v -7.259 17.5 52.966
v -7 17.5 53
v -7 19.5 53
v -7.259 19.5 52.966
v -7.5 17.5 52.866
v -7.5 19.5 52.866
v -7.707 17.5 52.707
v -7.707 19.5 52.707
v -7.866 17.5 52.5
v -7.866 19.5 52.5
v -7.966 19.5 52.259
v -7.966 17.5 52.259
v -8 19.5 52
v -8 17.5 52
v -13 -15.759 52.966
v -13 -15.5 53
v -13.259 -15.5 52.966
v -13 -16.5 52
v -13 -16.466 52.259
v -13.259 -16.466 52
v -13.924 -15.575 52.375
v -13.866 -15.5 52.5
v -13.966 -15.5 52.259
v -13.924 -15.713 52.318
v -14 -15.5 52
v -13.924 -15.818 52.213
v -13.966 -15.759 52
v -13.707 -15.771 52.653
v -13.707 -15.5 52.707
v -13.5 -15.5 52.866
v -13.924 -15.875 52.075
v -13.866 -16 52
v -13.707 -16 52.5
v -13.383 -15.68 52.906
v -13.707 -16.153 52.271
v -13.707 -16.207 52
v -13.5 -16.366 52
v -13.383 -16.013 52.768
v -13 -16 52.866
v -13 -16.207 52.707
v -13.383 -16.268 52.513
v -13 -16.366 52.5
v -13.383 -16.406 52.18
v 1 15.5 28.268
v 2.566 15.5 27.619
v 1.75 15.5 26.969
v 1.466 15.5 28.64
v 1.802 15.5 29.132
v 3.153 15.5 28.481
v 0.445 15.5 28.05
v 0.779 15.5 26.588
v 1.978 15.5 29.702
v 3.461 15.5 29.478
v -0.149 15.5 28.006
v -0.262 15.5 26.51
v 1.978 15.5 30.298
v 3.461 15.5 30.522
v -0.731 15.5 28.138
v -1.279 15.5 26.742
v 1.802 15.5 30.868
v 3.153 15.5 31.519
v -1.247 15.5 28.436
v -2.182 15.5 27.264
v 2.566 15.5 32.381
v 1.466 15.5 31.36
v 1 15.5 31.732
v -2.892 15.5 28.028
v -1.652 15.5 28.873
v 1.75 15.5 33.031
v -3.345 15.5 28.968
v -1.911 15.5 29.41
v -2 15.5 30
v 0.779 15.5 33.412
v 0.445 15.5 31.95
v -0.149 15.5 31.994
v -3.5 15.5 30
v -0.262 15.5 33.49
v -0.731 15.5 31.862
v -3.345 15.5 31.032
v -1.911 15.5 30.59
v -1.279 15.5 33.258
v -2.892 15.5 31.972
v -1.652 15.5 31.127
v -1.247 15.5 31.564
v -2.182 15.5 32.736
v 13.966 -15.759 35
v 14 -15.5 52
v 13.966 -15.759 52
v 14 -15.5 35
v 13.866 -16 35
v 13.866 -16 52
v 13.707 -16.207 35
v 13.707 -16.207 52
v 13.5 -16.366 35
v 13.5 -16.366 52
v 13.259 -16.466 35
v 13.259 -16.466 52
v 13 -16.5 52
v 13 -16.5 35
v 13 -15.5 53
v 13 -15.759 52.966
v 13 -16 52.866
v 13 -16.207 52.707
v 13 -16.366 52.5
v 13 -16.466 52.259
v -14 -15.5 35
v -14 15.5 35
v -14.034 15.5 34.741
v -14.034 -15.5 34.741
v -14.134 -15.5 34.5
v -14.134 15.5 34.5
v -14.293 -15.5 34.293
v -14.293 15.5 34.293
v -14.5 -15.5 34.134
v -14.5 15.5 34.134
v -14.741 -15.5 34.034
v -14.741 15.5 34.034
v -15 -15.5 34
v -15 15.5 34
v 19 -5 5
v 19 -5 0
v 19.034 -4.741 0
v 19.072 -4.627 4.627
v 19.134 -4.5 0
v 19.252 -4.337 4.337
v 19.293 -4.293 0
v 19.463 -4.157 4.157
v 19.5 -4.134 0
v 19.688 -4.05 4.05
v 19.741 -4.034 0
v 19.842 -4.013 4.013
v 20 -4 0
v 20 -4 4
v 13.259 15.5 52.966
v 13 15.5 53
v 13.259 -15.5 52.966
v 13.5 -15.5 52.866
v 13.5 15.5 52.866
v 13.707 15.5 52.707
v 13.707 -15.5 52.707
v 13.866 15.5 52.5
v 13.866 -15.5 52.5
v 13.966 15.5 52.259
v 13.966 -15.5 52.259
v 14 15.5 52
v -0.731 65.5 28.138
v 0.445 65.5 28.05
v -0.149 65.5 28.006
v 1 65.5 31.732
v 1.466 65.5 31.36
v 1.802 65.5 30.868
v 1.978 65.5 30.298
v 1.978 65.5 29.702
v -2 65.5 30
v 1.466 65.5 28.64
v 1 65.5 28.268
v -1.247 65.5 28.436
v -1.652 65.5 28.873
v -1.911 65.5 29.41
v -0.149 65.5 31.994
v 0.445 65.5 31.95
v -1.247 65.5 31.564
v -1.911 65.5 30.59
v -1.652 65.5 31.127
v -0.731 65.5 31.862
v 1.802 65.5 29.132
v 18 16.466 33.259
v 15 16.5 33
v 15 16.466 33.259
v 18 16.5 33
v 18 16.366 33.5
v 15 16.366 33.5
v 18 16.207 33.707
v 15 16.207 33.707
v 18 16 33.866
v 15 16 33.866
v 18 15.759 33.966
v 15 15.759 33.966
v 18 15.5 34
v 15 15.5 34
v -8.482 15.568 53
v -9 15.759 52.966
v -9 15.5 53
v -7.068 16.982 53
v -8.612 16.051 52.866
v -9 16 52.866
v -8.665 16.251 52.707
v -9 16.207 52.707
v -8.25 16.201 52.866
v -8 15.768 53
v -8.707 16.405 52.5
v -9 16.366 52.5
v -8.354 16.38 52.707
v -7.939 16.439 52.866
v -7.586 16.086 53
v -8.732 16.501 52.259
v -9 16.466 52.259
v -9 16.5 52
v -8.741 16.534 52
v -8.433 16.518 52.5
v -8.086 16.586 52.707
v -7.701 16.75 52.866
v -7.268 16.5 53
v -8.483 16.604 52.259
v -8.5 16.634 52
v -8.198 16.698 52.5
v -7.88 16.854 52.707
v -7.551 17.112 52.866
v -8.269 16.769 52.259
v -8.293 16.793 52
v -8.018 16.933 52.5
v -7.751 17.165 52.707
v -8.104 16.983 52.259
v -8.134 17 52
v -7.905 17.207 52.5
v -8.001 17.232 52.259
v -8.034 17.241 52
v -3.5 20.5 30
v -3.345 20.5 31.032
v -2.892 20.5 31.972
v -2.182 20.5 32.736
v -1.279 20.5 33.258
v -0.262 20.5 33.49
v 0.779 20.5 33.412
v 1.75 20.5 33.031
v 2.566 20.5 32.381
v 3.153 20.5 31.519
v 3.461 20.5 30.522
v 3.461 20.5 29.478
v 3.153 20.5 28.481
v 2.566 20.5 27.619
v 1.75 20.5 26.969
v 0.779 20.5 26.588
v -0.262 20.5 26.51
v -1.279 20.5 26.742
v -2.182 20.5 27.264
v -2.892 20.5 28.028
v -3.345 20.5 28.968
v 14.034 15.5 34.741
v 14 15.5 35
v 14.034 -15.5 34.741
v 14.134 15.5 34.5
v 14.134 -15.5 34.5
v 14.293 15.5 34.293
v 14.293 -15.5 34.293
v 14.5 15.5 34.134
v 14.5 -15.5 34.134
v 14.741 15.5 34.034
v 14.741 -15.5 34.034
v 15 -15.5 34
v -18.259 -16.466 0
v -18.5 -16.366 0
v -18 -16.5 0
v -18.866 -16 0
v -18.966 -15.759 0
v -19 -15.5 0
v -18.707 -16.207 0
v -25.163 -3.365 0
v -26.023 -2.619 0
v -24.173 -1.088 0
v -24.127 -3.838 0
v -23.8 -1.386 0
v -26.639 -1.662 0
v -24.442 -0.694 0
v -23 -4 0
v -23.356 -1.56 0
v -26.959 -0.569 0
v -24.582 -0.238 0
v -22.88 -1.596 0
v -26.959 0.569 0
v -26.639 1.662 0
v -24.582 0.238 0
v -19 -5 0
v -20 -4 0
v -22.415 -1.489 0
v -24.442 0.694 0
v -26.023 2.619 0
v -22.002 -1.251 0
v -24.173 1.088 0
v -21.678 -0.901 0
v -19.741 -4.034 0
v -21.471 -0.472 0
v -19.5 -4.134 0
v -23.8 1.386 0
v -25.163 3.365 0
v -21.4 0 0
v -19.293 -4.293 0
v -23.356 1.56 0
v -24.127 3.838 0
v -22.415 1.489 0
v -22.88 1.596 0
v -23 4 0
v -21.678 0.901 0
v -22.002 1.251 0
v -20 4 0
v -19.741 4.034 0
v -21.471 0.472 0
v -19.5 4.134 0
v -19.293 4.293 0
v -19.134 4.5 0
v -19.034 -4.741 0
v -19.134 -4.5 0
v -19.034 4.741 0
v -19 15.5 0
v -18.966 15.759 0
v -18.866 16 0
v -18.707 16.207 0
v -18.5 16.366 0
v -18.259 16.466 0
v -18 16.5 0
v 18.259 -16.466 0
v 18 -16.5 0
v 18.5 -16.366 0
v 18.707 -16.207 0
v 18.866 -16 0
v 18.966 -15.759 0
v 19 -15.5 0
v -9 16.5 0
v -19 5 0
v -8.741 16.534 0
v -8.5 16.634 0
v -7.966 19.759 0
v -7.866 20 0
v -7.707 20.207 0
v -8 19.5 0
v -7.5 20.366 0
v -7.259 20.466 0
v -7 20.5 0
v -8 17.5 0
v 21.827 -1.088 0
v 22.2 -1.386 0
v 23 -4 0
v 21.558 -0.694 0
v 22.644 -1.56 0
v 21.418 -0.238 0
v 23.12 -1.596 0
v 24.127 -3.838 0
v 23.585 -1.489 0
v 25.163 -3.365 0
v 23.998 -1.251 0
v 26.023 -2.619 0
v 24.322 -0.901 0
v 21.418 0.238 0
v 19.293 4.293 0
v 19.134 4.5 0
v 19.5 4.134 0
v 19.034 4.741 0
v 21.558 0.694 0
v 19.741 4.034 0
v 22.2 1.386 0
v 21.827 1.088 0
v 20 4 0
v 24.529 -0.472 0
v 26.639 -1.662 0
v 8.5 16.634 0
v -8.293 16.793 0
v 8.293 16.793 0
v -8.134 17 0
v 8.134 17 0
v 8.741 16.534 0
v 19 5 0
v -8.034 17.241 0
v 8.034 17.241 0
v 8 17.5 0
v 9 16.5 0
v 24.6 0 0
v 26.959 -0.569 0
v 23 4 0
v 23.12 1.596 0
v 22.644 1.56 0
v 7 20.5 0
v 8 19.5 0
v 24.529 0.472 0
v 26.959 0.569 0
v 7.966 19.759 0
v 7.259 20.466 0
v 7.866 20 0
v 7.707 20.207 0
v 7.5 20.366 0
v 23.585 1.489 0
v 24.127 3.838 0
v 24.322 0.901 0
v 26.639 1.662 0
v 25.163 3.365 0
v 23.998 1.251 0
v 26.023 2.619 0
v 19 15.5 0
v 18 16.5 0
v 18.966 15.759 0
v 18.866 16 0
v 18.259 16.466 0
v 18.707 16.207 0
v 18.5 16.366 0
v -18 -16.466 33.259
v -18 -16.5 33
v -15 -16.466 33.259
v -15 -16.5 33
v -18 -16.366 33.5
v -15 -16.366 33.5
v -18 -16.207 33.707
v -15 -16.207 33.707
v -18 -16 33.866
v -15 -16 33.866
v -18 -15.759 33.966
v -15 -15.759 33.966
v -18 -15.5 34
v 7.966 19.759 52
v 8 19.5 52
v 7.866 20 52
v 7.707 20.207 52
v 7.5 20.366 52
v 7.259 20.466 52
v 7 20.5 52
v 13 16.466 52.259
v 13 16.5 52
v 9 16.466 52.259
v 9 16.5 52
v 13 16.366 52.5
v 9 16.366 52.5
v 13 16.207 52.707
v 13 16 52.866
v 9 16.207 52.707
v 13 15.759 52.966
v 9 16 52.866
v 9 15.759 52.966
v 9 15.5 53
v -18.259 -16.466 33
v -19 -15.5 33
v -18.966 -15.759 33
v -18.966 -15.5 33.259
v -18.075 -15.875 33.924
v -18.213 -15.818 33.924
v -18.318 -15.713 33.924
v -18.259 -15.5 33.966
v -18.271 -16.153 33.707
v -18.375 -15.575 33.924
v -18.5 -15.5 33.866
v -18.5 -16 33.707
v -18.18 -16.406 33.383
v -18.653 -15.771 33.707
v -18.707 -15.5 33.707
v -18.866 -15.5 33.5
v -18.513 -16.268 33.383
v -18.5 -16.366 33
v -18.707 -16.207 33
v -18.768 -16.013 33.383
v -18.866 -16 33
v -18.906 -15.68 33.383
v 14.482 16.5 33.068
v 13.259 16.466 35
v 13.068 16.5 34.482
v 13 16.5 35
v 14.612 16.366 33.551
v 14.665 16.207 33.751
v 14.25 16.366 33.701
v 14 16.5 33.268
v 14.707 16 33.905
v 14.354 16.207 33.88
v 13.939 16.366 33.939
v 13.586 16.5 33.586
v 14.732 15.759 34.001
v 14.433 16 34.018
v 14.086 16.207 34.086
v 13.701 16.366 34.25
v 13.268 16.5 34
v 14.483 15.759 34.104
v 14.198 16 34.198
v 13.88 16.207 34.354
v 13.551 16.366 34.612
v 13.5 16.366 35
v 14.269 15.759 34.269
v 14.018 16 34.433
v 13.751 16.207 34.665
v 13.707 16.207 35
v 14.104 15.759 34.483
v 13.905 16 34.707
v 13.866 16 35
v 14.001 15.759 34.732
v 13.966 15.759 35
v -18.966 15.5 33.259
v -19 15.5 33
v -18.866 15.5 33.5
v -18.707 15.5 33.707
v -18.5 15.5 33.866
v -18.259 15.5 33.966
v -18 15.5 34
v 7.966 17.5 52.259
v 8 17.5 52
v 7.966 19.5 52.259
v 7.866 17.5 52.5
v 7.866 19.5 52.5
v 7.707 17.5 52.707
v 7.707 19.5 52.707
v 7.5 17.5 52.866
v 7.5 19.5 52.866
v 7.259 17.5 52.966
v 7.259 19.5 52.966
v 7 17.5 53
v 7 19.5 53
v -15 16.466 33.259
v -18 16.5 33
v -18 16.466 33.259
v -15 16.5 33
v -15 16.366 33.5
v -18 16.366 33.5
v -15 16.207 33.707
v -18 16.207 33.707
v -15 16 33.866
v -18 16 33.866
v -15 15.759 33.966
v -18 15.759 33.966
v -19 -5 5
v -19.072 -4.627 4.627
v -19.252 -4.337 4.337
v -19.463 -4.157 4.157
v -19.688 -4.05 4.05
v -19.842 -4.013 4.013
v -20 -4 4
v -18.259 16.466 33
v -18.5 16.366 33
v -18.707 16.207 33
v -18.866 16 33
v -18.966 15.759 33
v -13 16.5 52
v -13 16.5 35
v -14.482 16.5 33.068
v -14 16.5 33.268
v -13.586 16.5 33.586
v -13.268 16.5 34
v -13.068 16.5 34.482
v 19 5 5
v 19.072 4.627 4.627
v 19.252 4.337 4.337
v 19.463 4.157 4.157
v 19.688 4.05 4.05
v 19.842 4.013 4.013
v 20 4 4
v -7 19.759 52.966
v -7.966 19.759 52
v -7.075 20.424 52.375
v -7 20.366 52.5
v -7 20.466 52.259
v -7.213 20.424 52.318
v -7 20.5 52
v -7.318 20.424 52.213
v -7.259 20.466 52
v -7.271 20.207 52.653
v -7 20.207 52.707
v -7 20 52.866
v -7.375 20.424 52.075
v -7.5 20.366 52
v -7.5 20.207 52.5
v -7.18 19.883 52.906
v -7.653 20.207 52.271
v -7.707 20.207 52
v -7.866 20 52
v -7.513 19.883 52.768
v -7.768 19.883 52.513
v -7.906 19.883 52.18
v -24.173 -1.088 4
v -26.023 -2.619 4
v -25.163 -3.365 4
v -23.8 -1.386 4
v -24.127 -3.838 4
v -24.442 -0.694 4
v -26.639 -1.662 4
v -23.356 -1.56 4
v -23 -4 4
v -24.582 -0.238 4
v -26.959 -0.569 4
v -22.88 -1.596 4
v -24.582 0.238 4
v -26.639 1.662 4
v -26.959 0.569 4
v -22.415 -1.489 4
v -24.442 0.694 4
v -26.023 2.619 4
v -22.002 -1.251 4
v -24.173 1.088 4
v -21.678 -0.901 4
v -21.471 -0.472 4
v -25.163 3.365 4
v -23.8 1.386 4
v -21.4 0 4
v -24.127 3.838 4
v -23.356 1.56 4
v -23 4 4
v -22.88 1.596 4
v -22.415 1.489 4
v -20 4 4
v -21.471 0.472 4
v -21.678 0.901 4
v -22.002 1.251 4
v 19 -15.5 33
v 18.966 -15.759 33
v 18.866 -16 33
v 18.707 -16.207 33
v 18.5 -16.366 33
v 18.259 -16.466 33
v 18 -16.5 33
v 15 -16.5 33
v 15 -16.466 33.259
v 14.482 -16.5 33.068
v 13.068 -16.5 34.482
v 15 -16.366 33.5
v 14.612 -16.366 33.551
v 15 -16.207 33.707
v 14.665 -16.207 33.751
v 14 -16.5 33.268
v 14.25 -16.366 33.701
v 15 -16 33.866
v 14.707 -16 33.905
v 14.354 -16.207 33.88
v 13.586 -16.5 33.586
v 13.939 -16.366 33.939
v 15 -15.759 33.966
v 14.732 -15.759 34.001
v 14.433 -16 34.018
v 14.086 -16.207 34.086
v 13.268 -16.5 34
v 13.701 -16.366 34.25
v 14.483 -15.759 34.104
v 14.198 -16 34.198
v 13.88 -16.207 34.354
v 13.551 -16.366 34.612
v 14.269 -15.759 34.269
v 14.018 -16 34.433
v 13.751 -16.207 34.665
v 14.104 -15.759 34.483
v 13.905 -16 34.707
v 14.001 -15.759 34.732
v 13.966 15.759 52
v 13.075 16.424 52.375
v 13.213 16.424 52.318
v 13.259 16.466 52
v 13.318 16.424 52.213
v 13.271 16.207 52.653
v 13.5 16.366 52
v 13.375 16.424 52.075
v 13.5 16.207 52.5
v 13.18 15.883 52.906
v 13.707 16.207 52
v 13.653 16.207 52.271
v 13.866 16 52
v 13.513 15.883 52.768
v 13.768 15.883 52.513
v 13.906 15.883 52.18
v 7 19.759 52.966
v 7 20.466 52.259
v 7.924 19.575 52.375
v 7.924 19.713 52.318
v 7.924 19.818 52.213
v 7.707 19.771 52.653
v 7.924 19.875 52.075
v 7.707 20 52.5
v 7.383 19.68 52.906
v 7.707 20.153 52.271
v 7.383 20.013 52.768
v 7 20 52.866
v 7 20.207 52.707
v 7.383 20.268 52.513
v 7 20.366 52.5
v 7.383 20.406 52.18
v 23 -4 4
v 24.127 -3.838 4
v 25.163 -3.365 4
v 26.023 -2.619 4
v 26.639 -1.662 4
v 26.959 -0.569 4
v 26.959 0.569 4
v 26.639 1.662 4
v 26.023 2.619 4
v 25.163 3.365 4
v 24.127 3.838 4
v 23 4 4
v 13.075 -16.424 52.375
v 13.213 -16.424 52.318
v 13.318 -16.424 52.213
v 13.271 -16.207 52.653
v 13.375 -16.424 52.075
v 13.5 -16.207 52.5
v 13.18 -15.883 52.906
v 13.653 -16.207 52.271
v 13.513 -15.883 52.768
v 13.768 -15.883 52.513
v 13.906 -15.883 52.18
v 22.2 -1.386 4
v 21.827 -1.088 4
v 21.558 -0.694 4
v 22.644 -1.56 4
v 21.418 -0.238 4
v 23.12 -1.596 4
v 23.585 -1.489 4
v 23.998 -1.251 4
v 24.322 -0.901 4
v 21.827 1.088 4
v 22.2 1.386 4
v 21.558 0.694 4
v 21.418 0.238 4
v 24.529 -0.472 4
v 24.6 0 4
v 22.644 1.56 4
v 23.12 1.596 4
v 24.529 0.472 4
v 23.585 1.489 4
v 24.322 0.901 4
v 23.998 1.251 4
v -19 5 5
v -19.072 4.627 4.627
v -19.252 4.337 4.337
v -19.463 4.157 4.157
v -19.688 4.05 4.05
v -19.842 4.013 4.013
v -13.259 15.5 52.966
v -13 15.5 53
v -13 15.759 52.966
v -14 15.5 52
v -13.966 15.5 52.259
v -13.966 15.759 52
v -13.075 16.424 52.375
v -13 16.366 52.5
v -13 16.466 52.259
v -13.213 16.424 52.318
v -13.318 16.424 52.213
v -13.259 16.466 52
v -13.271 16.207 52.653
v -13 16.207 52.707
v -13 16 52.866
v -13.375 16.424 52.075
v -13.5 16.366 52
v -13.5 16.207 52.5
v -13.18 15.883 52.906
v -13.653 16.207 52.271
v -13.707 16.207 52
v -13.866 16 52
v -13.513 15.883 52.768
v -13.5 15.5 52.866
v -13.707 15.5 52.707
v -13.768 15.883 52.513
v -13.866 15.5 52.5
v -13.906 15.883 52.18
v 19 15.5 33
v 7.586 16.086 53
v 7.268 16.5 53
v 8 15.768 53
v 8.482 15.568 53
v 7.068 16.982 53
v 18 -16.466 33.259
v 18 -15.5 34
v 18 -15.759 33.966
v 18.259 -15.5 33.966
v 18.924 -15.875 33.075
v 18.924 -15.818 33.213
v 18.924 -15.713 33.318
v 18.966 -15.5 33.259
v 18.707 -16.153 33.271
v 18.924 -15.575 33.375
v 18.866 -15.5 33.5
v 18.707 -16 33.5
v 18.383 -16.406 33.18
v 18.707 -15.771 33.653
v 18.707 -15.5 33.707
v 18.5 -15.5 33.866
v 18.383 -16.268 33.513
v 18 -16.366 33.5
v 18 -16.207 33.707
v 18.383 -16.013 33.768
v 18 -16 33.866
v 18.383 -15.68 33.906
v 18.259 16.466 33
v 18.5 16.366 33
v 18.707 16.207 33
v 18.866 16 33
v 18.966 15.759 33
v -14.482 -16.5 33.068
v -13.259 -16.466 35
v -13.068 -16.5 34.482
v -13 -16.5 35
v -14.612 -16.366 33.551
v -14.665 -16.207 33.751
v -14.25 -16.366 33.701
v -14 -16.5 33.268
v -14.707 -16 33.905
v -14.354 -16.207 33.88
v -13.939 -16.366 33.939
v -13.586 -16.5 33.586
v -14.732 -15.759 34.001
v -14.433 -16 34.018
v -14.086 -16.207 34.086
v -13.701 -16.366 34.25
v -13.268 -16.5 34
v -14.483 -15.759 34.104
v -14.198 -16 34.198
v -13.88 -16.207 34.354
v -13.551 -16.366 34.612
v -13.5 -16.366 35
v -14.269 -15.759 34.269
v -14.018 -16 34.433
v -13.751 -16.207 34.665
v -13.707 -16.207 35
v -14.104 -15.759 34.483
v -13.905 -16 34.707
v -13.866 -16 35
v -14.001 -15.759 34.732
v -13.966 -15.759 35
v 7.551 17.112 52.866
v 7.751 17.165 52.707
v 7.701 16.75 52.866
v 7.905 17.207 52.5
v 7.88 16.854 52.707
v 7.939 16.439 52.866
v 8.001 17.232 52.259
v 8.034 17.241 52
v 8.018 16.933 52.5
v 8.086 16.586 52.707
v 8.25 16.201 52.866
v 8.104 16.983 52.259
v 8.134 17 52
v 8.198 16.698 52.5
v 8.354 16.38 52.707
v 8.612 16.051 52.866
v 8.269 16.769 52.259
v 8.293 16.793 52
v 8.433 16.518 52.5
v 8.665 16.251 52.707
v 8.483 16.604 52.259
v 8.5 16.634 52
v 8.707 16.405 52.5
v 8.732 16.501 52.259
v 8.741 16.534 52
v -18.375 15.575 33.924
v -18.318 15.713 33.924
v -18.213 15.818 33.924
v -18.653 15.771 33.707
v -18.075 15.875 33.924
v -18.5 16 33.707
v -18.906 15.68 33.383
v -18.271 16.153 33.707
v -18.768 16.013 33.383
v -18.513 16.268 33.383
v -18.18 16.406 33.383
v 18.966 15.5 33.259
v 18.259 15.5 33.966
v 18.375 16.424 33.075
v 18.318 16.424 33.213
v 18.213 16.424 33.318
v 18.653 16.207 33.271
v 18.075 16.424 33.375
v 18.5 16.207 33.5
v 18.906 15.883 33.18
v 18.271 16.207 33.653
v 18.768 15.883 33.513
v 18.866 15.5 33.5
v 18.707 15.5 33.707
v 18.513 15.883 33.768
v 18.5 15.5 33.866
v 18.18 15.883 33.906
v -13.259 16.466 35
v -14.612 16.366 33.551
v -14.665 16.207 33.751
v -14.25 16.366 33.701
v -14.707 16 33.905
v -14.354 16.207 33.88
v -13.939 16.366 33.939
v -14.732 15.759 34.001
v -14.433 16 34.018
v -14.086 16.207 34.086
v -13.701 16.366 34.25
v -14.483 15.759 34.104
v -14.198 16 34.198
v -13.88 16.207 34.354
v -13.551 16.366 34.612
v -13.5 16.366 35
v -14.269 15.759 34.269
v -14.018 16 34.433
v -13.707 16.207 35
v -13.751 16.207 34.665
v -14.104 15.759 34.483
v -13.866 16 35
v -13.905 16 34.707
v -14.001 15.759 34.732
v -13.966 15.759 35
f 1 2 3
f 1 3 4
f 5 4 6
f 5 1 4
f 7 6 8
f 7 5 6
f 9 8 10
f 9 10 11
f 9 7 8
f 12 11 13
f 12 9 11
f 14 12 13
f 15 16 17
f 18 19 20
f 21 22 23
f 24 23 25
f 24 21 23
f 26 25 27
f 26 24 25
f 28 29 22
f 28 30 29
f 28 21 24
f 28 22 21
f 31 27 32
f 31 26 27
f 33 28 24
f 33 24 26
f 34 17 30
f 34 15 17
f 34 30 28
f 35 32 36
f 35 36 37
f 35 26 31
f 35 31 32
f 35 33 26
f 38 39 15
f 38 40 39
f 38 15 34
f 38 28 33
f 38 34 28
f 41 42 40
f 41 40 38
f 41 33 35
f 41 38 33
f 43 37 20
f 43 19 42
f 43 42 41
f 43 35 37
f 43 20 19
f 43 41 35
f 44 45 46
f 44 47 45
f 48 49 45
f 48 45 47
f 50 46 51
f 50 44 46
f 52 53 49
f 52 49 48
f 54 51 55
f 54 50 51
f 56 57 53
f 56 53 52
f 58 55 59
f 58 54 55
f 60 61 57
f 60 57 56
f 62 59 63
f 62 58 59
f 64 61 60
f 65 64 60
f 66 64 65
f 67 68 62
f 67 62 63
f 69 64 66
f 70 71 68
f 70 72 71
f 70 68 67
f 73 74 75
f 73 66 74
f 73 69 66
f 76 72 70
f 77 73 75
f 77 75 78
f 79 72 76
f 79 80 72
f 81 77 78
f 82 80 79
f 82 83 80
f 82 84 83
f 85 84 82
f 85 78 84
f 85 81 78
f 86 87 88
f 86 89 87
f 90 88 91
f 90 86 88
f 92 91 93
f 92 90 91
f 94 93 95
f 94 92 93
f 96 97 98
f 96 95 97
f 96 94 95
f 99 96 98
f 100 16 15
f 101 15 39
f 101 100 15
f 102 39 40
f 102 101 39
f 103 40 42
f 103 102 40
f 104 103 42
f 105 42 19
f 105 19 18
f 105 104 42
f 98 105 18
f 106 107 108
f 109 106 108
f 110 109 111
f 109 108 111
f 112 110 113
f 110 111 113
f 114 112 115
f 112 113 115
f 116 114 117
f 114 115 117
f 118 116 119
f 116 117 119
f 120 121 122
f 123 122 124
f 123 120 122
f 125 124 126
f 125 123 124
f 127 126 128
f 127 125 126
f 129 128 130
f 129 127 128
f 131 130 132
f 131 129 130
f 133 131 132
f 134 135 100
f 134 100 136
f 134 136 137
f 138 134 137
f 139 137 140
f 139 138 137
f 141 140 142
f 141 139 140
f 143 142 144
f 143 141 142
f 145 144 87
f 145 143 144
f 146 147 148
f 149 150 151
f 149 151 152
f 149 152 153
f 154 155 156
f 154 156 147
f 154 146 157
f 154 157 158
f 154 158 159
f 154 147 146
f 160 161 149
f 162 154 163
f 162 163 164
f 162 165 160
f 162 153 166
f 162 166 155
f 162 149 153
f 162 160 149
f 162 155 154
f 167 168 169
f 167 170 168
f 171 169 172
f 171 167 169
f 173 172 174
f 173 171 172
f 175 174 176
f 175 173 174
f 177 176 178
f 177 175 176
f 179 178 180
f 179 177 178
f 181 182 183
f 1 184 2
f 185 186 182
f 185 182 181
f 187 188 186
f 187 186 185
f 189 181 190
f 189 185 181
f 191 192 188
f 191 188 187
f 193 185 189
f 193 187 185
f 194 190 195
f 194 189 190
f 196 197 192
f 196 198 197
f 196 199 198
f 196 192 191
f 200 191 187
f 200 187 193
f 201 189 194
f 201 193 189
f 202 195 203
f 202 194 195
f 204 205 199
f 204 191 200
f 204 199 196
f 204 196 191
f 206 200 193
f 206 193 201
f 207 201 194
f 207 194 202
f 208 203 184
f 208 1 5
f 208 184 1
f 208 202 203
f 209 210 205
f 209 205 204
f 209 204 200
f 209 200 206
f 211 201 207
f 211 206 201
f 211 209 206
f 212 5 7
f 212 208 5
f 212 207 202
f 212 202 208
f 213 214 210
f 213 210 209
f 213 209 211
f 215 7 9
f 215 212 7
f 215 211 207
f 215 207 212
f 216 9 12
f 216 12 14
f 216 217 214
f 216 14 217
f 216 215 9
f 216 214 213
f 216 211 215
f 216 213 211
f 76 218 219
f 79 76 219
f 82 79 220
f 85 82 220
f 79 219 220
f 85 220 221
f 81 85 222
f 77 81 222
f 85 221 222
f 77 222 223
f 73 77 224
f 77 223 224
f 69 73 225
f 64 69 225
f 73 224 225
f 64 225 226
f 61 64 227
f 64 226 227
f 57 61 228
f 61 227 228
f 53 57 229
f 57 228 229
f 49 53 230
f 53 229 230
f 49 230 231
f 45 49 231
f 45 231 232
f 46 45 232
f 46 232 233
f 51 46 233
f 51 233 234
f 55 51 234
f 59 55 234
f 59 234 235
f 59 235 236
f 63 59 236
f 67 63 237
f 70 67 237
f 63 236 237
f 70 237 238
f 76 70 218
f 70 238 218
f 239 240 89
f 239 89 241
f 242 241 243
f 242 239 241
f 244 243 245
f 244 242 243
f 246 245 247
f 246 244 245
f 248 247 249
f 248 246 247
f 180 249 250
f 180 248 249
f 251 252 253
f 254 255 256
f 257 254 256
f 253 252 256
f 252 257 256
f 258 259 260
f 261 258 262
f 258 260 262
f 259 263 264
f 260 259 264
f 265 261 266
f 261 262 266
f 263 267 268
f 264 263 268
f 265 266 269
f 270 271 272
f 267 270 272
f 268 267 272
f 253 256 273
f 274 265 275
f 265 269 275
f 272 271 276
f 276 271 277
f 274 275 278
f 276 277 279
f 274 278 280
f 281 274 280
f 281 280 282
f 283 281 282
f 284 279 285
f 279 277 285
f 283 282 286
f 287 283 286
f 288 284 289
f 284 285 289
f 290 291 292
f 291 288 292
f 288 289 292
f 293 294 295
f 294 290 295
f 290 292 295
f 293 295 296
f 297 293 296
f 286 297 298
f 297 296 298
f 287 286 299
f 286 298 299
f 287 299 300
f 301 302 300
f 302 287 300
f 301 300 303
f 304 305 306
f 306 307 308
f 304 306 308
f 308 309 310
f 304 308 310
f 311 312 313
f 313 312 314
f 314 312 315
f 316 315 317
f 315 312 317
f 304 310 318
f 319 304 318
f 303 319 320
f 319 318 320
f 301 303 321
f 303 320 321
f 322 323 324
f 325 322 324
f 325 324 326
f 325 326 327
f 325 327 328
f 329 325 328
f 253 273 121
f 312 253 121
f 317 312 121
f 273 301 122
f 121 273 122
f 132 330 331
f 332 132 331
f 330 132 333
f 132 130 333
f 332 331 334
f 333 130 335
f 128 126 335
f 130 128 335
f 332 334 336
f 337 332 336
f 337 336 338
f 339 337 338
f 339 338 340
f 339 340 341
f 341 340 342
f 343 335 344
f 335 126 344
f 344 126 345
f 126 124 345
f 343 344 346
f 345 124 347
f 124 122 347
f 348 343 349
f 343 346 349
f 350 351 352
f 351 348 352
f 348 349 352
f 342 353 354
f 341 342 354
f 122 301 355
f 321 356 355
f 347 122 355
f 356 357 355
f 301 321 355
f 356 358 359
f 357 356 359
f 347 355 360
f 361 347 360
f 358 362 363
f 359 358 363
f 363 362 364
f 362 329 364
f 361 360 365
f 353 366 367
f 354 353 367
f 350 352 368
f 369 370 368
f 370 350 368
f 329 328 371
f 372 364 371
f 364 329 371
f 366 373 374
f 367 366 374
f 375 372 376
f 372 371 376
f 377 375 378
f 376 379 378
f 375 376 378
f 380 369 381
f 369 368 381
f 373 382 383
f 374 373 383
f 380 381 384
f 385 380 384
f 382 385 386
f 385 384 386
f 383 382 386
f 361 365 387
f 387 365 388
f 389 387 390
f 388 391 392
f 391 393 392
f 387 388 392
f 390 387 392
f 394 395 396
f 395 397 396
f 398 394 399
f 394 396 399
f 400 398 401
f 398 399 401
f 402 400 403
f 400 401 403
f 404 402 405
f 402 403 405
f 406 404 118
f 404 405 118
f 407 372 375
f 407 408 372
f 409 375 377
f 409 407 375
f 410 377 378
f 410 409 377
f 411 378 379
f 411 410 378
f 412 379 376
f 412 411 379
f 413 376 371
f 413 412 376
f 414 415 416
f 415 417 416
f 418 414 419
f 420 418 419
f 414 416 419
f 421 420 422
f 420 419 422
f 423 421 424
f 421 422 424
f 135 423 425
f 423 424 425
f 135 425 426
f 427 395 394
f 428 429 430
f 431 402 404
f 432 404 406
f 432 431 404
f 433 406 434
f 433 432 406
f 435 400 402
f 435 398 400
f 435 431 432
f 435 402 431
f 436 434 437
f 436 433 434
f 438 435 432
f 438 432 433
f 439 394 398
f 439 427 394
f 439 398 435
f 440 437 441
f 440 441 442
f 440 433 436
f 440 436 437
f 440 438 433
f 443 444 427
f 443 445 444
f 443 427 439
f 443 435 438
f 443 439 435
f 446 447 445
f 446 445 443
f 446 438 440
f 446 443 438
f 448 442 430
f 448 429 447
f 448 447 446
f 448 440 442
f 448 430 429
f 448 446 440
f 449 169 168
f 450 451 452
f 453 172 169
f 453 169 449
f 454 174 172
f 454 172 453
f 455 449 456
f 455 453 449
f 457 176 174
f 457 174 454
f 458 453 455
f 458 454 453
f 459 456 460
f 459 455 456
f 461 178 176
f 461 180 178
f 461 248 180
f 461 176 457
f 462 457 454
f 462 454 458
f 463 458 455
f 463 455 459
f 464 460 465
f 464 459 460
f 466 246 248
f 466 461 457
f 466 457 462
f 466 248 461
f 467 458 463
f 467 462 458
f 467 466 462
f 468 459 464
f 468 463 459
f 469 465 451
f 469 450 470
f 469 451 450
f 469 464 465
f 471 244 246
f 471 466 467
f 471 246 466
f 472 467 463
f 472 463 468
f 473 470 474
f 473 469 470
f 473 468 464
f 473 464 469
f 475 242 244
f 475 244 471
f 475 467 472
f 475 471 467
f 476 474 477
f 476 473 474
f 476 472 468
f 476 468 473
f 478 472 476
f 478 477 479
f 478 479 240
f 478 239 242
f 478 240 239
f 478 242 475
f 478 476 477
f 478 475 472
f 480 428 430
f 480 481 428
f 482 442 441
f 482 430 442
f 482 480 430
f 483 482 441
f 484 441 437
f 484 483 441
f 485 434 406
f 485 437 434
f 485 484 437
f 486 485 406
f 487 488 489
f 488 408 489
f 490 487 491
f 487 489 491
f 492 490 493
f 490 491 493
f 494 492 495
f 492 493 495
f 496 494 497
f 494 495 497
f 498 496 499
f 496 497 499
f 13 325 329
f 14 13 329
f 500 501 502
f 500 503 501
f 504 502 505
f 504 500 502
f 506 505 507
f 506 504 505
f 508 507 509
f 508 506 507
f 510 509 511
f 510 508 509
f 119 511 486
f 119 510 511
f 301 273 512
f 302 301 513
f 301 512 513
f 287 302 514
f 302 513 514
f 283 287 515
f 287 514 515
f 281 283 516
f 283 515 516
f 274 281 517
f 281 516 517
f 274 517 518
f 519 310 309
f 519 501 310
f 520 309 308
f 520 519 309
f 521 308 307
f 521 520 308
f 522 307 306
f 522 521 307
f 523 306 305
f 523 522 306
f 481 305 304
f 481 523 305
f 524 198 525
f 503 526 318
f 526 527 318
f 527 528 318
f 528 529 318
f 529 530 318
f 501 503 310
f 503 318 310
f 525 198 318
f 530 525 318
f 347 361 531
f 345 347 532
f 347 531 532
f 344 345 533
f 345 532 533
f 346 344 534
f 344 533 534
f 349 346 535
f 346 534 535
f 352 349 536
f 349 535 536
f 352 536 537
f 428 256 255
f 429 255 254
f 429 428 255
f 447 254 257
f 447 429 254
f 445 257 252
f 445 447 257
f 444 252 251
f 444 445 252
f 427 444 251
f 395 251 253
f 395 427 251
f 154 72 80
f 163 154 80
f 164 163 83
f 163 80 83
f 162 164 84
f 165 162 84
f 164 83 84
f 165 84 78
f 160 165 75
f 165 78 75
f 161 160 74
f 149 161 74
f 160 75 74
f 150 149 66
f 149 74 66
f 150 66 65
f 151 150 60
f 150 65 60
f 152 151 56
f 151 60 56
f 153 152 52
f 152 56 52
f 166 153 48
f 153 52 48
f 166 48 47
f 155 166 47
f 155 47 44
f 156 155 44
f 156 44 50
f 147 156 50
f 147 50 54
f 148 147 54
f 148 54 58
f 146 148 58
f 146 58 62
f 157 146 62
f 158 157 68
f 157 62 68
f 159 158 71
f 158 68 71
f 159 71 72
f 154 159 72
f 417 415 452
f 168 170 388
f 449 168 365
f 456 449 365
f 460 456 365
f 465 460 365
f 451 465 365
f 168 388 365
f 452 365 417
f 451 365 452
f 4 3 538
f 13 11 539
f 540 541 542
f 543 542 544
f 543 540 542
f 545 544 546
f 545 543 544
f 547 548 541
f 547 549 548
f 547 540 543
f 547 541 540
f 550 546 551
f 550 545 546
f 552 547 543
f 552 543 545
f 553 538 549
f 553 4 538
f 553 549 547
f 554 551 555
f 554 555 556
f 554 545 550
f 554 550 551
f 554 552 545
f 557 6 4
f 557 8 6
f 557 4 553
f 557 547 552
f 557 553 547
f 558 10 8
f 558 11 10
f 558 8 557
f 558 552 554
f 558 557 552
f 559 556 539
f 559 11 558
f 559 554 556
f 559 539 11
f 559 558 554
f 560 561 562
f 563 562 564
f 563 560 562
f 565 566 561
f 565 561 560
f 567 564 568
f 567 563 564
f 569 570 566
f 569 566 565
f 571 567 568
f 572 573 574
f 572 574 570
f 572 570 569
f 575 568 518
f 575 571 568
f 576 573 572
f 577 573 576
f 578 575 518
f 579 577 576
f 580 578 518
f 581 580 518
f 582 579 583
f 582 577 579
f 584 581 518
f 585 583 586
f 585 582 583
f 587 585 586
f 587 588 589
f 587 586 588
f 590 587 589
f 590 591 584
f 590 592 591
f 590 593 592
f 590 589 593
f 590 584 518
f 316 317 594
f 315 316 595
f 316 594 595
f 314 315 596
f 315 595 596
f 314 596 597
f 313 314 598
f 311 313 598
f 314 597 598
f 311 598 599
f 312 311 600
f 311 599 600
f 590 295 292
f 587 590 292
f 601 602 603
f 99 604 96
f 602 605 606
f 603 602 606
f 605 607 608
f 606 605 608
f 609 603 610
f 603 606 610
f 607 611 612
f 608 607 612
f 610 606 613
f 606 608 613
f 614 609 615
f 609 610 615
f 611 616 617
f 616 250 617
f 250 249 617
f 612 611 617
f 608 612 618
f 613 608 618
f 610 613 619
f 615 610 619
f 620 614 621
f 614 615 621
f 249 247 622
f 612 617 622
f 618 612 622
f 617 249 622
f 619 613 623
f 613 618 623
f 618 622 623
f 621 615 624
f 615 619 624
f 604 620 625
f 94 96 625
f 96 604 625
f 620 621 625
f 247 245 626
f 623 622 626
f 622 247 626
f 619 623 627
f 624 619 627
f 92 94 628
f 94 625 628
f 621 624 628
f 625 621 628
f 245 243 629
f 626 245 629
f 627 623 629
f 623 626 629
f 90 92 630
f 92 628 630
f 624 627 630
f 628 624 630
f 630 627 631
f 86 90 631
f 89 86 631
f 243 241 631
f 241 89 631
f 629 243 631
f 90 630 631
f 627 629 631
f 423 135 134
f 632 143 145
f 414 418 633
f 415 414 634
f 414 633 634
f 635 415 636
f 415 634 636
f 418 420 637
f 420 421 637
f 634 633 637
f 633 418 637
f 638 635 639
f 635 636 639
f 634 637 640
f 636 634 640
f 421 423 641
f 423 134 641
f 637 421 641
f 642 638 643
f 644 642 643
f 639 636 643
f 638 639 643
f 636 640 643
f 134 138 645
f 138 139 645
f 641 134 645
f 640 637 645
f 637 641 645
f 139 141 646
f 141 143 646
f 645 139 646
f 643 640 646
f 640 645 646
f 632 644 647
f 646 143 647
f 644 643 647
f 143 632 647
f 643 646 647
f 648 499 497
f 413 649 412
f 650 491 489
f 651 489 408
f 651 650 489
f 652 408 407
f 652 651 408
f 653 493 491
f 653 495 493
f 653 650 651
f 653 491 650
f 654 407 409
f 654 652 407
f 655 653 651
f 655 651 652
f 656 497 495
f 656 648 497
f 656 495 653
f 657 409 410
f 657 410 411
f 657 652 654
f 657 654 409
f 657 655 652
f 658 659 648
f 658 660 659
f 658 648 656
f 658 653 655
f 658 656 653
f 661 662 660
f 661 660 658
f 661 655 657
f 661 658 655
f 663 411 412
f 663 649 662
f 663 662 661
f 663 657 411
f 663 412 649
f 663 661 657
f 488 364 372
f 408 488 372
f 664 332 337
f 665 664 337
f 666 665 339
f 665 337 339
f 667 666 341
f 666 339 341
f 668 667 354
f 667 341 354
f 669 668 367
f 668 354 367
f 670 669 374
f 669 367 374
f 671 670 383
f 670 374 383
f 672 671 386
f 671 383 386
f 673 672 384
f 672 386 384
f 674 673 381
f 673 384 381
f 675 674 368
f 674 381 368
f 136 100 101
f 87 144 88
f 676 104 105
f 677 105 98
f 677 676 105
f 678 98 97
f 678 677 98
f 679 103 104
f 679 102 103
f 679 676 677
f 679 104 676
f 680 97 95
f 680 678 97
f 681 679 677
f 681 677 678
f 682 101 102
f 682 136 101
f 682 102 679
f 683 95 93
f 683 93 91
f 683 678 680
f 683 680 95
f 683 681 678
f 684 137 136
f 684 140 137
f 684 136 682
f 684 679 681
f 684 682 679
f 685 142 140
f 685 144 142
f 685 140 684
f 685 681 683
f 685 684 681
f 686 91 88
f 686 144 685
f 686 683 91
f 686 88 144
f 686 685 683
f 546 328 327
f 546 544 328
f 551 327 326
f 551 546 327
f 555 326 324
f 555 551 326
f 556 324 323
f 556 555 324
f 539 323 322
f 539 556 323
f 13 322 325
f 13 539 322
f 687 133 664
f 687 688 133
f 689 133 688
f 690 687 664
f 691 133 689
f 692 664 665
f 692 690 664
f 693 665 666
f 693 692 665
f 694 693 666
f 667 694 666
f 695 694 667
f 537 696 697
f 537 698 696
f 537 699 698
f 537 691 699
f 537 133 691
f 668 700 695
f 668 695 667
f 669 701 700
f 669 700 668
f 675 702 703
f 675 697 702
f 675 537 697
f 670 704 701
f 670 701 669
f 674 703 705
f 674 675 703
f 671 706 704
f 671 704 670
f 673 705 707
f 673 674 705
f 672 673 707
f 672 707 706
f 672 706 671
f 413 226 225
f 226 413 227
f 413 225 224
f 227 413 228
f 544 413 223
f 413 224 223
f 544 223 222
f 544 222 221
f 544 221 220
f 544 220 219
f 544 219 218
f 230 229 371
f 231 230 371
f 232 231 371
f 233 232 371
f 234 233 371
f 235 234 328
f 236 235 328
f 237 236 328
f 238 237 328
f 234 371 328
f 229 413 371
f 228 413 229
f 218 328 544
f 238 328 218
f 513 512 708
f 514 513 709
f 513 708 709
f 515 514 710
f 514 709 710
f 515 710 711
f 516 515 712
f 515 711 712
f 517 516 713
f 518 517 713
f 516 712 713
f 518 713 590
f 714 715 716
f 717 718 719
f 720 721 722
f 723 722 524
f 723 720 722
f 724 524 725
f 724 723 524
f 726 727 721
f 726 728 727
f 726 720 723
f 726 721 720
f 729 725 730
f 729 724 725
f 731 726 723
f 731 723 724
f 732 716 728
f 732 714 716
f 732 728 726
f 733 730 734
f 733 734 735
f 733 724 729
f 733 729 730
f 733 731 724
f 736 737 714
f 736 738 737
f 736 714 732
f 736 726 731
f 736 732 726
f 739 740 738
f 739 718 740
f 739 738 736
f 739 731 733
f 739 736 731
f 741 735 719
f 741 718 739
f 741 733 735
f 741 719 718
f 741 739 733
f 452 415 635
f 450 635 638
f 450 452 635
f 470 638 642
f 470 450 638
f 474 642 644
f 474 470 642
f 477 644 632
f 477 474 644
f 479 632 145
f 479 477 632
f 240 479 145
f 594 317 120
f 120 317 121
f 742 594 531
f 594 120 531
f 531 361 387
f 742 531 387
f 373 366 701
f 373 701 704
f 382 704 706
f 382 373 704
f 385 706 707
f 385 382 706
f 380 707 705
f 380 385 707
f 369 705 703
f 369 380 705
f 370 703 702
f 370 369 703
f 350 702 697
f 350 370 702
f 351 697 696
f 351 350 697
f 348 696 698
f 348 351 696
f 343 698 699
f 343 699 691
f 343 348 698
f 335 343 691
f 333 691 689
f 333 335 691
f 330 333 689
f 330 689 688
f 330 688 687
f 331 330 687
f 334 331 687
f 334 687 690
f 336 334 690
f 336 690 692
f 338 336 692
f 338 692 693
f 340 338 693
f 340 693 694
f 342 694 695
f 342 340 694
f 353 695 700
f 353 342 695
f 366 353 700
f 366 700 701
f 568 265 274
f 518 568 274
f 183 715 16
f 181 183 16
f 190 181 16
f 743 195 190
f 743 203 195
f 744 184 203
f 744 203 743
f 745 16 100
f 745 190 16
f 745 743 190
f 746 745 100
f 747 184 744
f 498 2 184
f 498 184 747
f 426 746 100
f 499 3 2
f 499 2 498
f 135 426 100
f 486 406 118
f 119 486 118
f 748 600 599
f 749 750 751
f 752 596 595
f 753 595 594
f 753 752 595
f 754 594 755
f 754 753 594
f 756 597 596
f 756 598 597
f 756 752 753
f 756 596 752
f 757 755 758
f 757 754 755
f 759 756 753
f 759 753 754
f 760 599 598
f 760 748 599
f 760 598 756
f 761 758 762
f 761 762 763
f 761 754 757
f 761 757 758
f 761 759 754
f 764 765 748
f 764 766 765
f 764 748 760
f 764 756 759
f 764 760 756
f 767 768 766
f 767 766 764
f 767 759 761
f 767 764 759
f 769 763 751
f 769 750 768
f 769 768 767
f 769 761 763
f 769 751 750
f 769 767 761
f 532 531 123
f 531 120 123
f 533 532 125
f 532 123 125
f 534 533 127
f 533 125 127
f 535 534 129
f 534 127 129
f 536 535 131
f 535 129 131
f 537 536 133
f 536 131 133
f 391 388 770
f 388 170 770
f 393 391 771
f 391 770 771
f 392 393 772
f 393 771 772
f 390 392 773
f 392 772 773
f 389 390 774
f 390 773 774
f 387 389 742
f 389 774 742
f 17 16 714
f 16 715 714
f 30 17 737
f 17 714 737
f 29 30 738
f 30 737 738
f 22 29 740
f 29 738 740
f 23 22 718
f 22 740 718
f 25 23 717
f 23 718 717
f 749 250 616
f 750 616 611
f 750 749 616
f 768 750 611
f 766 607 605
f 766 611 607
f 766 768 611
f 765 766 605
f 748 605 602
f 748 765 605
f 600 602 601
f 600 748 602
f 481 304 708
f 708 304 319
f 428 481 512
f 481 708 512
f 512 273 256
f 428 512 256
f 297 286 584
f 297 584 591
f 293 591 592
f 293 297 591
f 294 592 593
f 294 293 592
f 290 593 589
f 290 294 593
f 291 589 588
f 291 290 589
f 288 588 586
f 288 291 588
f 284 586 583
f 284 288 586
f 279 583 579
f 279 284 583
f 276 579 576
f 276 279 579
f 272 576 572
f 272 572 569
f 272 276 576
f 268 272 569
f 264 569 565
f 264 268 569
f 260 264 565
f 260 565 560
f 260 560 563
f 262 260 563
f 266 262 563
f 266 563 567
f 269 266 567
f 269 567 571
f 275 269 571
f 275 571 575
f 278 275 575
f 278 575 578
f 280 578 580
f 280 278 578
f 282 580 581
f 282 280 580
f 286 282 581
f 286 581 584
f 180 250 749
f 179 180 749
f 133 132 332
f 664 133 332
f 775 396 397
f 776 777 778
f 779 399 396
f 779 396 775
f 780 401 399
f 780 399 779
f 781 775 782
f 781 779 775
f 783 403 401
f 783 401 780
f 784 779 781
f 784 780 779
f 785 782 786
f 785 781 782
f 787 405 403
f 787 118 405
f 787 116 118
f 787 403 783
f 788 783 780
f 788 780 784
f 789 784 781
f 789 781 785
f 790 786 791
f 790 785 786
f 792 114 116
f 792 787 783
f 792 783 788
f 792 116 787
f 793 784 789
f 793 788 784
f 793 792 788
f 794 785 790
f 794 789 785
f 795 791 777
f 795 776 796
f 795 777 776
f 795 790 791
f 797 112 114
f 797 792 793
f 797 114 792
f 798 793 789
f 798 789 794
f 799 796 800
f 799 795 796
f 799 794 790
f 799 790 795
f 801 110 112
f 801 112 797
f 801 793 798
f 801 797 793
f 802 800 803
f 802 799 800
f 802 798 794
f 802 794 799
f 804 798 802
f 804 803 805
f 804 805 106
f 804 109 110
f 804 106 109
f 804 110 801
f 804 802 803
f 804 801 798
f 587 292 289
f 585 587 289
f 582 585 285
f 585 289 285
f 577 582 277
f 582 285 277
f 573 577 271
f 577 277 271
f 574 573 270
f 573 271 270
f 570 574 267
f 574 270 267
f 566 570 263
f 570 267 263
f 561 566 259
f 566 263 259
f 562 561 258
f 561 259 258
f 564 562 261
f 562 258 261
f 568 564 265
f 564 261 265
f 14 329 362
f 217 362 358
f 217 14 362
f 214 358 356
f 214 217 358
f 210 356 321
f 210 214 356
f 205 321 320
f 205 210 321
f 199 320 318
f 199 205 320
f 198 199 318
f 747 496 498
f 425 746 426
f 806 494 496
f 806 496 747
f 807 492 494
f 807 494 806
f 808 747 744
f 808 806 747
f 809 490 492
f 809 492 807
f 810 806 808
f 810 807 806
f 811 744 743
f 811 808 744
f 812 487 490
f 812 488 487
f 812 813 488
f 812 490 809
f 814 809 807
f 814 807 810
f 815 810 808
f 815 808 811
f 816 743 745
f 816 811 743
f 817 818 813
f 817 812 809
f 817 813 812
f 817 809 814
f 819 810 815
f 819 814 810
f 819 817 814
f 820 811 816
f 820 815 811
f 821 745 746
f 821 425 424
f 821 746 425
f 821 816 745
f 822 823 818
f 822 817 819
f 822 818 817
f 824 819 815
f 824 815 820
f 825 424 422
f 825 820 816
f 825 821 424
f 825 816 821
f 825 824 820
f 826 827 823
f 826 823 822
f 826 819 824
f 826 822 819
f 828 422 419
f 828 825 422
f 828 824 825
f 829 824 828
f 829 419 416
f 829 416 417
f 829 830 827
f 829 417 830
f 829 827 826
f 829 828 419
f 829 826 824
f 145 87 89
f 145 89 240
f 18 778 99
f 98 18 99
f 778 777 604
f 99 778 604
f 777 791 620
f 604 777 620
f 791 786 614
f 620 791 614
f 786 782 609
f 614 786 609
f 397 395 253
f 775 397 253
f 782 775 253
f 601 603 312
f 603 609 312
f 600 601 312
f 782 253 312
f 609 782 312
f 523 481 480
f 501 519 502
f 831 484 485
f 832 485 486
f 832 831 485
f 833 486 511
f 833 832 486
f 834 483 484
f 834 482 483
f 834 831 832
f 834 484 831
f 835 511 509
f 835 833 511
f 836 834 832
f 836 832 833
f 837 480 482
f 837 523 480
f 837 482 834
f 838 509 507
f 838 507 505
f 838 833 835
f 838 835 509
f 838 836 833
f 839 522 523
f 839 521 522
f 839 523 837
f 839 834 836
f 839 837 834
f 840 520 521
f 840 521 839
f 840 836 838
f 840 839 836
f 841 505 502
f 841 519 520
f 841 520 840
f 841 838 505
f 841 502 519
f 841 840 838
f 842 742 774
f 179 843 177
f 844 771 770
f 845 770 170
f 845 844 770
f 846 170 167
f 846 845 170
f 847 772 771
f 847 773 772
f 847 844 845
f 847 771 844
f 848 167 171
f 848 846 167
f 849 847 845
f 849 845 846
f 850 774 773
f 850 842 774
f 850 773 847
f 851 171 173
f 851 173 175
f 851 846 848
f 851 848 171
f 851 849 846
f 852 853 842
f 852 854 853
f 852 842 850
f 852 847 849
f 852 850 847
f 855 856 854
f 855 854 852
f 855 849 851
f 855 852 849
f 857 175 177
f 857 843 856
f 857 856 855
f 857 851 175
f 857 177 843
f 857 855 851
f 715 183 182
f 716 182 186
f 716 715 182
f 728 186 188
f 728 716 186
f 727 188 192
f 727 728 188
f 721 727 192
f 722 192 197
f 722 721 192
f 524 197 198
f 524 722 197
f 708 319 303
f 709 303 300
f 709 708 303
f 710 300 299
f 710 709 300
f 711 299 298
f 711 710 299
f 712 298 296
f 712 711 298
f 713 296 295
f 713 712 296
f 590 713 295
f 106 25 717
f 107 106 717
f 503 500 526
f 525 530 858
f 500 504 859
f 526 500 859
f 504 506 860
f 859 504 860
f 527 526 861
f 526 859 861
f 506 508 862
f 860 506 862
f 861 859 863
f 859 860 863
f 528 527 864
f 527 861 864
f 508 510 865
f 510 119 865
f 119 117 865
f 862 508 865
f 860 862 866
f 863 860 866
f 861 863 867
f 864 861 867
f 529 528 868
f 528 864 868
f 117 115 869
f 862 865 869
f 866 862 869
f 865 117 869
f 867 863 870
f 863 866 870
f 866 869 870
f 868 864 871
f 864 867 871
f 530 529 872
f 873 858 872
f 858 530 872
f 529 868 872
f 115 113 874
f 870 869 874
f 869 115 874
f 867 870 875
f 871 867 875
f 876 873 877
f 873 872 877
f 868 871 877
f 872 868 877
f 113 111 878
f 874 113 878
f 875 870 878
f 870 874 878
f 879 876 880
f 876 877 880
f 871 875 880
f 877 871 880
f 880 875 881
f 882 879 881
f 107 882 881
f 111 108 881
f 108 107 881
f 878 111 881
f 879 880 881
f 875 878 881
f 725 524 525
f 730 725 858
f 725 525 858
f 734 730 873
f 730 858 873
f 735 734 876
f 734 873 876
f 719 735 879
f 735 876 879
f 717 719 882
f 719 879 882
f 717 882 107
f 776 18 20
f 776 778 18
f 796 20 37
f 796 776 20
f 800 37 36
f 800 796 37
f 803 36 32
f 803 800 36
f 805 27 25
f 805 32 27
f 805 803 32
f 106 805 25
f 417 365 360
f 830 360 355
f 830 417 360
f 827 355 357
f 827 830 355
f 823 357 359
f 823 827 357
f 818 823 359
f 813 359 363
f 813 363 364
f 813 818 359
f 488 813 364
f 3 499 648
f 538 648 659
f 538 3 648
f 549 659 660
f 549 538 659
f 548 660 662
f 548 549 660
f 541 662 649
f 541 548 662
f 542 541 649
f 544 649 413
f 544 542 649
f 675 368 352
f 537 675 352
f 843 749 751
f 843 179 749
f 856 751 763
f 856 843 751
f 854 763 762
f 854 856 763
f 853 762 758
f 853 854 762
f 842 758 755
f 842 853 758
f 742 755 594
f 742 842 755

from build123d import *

# Parameters (mm, degrees)
F1_DEPTH = 53
F2_W     = 5
F2_H     = 33
F3_DEPTH = 19
F4_R     = 3.5
F5_DEPTH = 5
F0_R     = 1.6
F6_DEPTH = 4
F7_R     = 2
F8_DEPTH = 50
F9_R     = 1


with BuildPart() as f1:
    # F0 (on Top) → F1 (new body)
    with BuildSketch(Plane.XY):
        Polygon((19, 4), (19, 16.5), (8, 16.5), (8, 20.5), (0, 20.5), (-8, 20.5), (-8, 16.5), (-19, 16.5), (-19, 4), (-19, -4), (-19, -16.5), (19, -16.5), (19, -4), align=None)
    extrude(amount=F1_DEPTH)

    # F2 (on face) → F3 (cut)
    with BuildSketch(Plane.XY.offset(53)):
        with Locations((-16.5, 0)):
            Rectangle(F2_W, F2_H)
        with Locations((16.5, 0)):
            Rectangle(F2_W, F2_H)
    extrude(amount=-F3_DEPTH, mode=Mode.SUBTRACT)

    # F4 (on face) → F5 (cut)
    with BuildSketch(Plane(origin=(0, 20.5, 0), x_dir=(-1, 0, 0), z_dir=(0, 1, 0))):
        with Locations((0, 30)):
            Circle(F4_R)
    extrude(amount=-F5_DEPTH, mode=Mode.SUBTRACT)

    # F0 (on Top) → F6 (join)
    with BuildSketch(Plane.XY):
        with BuildLine():
            Line((-23, -4), (-19, -4))
            Line((-19, -4), (-19, 4))
            Line((-19, 4), (-23, 4))
            ThreePointArc((-23, 4), (-27, 0), (-23, -4))
        make_face()
        with Locations((-23, 0)):
            Circle(F0_R, mode=Mode.SUBTRACT)
        with BuildLine():
            Line((23, 4), (19, 4))
            Line((19, 4), (19, -4))
            Line((19, -4), (23, -4))
            ThreePointArc((23, -4), (27, 0), (23, 4))
        make_face()
        with Locations((23, 0)):
            Circle(F0_R, mode=Mode.SUBTRACT)
    extrude(amount=F6_DEPTH)

    # F7 (on face) → F8 (join)
    with BuildSketch(Plane(origin=(0, 15.5, 0), x_dir=(-1, 0, 0), z_dir=(0, 1, 0))):
        with Locations((0, 30)):
            Circle(F7_R)
    extrude(amount=F8_DEPTH)

    # F9
    f9_edges = [f1.edges().sort_by_distance(p)[0] for p in [
        (14, 0, 53),
        (0, -16.5, 53),
        (-14, 0, 53),
        (-11, 16.5, 53),
        (-8, 18.5, 53),
        (0, 20.5, 53),
        (8, 18.5, 53),
        (11, 16.5, 53),
        (-14, -16.5, 43.5),
        (-14, 16.5, 43.5),
        (-14, 0, 34),
        (14, 16.5, 43.5),
        (14, -16.5, 43.5),
        (14, 0, 34),
        (-19, -16.5, 17),
        (-16.5, -16.5, 34),
        (16.5, -16.5, 34),
        (19, -16.5, 17),
        (19, 0, 34),
        (19, 16.5, 17),
        (19, 0, 4),
        (19, -4, 2),
        (19, 4, 2),
        (8, 16.5, 26.5),
        (8, 20.5, 26.5),
        (-8, 20.5, 26.5),
        (-19, 16.5, 17),
        (-8, 16.5, 26.5),
        (-19, 0, 34),
        (-19, 4, 2),
        (-19, 0, 4),
        (-19, -4, 2),
        (16.5, 16.5, 34),
        (-16.5, 16.5, 34),
    ]]
    fillet(f9_edges, radius=F9_R)


solid = f1.part
